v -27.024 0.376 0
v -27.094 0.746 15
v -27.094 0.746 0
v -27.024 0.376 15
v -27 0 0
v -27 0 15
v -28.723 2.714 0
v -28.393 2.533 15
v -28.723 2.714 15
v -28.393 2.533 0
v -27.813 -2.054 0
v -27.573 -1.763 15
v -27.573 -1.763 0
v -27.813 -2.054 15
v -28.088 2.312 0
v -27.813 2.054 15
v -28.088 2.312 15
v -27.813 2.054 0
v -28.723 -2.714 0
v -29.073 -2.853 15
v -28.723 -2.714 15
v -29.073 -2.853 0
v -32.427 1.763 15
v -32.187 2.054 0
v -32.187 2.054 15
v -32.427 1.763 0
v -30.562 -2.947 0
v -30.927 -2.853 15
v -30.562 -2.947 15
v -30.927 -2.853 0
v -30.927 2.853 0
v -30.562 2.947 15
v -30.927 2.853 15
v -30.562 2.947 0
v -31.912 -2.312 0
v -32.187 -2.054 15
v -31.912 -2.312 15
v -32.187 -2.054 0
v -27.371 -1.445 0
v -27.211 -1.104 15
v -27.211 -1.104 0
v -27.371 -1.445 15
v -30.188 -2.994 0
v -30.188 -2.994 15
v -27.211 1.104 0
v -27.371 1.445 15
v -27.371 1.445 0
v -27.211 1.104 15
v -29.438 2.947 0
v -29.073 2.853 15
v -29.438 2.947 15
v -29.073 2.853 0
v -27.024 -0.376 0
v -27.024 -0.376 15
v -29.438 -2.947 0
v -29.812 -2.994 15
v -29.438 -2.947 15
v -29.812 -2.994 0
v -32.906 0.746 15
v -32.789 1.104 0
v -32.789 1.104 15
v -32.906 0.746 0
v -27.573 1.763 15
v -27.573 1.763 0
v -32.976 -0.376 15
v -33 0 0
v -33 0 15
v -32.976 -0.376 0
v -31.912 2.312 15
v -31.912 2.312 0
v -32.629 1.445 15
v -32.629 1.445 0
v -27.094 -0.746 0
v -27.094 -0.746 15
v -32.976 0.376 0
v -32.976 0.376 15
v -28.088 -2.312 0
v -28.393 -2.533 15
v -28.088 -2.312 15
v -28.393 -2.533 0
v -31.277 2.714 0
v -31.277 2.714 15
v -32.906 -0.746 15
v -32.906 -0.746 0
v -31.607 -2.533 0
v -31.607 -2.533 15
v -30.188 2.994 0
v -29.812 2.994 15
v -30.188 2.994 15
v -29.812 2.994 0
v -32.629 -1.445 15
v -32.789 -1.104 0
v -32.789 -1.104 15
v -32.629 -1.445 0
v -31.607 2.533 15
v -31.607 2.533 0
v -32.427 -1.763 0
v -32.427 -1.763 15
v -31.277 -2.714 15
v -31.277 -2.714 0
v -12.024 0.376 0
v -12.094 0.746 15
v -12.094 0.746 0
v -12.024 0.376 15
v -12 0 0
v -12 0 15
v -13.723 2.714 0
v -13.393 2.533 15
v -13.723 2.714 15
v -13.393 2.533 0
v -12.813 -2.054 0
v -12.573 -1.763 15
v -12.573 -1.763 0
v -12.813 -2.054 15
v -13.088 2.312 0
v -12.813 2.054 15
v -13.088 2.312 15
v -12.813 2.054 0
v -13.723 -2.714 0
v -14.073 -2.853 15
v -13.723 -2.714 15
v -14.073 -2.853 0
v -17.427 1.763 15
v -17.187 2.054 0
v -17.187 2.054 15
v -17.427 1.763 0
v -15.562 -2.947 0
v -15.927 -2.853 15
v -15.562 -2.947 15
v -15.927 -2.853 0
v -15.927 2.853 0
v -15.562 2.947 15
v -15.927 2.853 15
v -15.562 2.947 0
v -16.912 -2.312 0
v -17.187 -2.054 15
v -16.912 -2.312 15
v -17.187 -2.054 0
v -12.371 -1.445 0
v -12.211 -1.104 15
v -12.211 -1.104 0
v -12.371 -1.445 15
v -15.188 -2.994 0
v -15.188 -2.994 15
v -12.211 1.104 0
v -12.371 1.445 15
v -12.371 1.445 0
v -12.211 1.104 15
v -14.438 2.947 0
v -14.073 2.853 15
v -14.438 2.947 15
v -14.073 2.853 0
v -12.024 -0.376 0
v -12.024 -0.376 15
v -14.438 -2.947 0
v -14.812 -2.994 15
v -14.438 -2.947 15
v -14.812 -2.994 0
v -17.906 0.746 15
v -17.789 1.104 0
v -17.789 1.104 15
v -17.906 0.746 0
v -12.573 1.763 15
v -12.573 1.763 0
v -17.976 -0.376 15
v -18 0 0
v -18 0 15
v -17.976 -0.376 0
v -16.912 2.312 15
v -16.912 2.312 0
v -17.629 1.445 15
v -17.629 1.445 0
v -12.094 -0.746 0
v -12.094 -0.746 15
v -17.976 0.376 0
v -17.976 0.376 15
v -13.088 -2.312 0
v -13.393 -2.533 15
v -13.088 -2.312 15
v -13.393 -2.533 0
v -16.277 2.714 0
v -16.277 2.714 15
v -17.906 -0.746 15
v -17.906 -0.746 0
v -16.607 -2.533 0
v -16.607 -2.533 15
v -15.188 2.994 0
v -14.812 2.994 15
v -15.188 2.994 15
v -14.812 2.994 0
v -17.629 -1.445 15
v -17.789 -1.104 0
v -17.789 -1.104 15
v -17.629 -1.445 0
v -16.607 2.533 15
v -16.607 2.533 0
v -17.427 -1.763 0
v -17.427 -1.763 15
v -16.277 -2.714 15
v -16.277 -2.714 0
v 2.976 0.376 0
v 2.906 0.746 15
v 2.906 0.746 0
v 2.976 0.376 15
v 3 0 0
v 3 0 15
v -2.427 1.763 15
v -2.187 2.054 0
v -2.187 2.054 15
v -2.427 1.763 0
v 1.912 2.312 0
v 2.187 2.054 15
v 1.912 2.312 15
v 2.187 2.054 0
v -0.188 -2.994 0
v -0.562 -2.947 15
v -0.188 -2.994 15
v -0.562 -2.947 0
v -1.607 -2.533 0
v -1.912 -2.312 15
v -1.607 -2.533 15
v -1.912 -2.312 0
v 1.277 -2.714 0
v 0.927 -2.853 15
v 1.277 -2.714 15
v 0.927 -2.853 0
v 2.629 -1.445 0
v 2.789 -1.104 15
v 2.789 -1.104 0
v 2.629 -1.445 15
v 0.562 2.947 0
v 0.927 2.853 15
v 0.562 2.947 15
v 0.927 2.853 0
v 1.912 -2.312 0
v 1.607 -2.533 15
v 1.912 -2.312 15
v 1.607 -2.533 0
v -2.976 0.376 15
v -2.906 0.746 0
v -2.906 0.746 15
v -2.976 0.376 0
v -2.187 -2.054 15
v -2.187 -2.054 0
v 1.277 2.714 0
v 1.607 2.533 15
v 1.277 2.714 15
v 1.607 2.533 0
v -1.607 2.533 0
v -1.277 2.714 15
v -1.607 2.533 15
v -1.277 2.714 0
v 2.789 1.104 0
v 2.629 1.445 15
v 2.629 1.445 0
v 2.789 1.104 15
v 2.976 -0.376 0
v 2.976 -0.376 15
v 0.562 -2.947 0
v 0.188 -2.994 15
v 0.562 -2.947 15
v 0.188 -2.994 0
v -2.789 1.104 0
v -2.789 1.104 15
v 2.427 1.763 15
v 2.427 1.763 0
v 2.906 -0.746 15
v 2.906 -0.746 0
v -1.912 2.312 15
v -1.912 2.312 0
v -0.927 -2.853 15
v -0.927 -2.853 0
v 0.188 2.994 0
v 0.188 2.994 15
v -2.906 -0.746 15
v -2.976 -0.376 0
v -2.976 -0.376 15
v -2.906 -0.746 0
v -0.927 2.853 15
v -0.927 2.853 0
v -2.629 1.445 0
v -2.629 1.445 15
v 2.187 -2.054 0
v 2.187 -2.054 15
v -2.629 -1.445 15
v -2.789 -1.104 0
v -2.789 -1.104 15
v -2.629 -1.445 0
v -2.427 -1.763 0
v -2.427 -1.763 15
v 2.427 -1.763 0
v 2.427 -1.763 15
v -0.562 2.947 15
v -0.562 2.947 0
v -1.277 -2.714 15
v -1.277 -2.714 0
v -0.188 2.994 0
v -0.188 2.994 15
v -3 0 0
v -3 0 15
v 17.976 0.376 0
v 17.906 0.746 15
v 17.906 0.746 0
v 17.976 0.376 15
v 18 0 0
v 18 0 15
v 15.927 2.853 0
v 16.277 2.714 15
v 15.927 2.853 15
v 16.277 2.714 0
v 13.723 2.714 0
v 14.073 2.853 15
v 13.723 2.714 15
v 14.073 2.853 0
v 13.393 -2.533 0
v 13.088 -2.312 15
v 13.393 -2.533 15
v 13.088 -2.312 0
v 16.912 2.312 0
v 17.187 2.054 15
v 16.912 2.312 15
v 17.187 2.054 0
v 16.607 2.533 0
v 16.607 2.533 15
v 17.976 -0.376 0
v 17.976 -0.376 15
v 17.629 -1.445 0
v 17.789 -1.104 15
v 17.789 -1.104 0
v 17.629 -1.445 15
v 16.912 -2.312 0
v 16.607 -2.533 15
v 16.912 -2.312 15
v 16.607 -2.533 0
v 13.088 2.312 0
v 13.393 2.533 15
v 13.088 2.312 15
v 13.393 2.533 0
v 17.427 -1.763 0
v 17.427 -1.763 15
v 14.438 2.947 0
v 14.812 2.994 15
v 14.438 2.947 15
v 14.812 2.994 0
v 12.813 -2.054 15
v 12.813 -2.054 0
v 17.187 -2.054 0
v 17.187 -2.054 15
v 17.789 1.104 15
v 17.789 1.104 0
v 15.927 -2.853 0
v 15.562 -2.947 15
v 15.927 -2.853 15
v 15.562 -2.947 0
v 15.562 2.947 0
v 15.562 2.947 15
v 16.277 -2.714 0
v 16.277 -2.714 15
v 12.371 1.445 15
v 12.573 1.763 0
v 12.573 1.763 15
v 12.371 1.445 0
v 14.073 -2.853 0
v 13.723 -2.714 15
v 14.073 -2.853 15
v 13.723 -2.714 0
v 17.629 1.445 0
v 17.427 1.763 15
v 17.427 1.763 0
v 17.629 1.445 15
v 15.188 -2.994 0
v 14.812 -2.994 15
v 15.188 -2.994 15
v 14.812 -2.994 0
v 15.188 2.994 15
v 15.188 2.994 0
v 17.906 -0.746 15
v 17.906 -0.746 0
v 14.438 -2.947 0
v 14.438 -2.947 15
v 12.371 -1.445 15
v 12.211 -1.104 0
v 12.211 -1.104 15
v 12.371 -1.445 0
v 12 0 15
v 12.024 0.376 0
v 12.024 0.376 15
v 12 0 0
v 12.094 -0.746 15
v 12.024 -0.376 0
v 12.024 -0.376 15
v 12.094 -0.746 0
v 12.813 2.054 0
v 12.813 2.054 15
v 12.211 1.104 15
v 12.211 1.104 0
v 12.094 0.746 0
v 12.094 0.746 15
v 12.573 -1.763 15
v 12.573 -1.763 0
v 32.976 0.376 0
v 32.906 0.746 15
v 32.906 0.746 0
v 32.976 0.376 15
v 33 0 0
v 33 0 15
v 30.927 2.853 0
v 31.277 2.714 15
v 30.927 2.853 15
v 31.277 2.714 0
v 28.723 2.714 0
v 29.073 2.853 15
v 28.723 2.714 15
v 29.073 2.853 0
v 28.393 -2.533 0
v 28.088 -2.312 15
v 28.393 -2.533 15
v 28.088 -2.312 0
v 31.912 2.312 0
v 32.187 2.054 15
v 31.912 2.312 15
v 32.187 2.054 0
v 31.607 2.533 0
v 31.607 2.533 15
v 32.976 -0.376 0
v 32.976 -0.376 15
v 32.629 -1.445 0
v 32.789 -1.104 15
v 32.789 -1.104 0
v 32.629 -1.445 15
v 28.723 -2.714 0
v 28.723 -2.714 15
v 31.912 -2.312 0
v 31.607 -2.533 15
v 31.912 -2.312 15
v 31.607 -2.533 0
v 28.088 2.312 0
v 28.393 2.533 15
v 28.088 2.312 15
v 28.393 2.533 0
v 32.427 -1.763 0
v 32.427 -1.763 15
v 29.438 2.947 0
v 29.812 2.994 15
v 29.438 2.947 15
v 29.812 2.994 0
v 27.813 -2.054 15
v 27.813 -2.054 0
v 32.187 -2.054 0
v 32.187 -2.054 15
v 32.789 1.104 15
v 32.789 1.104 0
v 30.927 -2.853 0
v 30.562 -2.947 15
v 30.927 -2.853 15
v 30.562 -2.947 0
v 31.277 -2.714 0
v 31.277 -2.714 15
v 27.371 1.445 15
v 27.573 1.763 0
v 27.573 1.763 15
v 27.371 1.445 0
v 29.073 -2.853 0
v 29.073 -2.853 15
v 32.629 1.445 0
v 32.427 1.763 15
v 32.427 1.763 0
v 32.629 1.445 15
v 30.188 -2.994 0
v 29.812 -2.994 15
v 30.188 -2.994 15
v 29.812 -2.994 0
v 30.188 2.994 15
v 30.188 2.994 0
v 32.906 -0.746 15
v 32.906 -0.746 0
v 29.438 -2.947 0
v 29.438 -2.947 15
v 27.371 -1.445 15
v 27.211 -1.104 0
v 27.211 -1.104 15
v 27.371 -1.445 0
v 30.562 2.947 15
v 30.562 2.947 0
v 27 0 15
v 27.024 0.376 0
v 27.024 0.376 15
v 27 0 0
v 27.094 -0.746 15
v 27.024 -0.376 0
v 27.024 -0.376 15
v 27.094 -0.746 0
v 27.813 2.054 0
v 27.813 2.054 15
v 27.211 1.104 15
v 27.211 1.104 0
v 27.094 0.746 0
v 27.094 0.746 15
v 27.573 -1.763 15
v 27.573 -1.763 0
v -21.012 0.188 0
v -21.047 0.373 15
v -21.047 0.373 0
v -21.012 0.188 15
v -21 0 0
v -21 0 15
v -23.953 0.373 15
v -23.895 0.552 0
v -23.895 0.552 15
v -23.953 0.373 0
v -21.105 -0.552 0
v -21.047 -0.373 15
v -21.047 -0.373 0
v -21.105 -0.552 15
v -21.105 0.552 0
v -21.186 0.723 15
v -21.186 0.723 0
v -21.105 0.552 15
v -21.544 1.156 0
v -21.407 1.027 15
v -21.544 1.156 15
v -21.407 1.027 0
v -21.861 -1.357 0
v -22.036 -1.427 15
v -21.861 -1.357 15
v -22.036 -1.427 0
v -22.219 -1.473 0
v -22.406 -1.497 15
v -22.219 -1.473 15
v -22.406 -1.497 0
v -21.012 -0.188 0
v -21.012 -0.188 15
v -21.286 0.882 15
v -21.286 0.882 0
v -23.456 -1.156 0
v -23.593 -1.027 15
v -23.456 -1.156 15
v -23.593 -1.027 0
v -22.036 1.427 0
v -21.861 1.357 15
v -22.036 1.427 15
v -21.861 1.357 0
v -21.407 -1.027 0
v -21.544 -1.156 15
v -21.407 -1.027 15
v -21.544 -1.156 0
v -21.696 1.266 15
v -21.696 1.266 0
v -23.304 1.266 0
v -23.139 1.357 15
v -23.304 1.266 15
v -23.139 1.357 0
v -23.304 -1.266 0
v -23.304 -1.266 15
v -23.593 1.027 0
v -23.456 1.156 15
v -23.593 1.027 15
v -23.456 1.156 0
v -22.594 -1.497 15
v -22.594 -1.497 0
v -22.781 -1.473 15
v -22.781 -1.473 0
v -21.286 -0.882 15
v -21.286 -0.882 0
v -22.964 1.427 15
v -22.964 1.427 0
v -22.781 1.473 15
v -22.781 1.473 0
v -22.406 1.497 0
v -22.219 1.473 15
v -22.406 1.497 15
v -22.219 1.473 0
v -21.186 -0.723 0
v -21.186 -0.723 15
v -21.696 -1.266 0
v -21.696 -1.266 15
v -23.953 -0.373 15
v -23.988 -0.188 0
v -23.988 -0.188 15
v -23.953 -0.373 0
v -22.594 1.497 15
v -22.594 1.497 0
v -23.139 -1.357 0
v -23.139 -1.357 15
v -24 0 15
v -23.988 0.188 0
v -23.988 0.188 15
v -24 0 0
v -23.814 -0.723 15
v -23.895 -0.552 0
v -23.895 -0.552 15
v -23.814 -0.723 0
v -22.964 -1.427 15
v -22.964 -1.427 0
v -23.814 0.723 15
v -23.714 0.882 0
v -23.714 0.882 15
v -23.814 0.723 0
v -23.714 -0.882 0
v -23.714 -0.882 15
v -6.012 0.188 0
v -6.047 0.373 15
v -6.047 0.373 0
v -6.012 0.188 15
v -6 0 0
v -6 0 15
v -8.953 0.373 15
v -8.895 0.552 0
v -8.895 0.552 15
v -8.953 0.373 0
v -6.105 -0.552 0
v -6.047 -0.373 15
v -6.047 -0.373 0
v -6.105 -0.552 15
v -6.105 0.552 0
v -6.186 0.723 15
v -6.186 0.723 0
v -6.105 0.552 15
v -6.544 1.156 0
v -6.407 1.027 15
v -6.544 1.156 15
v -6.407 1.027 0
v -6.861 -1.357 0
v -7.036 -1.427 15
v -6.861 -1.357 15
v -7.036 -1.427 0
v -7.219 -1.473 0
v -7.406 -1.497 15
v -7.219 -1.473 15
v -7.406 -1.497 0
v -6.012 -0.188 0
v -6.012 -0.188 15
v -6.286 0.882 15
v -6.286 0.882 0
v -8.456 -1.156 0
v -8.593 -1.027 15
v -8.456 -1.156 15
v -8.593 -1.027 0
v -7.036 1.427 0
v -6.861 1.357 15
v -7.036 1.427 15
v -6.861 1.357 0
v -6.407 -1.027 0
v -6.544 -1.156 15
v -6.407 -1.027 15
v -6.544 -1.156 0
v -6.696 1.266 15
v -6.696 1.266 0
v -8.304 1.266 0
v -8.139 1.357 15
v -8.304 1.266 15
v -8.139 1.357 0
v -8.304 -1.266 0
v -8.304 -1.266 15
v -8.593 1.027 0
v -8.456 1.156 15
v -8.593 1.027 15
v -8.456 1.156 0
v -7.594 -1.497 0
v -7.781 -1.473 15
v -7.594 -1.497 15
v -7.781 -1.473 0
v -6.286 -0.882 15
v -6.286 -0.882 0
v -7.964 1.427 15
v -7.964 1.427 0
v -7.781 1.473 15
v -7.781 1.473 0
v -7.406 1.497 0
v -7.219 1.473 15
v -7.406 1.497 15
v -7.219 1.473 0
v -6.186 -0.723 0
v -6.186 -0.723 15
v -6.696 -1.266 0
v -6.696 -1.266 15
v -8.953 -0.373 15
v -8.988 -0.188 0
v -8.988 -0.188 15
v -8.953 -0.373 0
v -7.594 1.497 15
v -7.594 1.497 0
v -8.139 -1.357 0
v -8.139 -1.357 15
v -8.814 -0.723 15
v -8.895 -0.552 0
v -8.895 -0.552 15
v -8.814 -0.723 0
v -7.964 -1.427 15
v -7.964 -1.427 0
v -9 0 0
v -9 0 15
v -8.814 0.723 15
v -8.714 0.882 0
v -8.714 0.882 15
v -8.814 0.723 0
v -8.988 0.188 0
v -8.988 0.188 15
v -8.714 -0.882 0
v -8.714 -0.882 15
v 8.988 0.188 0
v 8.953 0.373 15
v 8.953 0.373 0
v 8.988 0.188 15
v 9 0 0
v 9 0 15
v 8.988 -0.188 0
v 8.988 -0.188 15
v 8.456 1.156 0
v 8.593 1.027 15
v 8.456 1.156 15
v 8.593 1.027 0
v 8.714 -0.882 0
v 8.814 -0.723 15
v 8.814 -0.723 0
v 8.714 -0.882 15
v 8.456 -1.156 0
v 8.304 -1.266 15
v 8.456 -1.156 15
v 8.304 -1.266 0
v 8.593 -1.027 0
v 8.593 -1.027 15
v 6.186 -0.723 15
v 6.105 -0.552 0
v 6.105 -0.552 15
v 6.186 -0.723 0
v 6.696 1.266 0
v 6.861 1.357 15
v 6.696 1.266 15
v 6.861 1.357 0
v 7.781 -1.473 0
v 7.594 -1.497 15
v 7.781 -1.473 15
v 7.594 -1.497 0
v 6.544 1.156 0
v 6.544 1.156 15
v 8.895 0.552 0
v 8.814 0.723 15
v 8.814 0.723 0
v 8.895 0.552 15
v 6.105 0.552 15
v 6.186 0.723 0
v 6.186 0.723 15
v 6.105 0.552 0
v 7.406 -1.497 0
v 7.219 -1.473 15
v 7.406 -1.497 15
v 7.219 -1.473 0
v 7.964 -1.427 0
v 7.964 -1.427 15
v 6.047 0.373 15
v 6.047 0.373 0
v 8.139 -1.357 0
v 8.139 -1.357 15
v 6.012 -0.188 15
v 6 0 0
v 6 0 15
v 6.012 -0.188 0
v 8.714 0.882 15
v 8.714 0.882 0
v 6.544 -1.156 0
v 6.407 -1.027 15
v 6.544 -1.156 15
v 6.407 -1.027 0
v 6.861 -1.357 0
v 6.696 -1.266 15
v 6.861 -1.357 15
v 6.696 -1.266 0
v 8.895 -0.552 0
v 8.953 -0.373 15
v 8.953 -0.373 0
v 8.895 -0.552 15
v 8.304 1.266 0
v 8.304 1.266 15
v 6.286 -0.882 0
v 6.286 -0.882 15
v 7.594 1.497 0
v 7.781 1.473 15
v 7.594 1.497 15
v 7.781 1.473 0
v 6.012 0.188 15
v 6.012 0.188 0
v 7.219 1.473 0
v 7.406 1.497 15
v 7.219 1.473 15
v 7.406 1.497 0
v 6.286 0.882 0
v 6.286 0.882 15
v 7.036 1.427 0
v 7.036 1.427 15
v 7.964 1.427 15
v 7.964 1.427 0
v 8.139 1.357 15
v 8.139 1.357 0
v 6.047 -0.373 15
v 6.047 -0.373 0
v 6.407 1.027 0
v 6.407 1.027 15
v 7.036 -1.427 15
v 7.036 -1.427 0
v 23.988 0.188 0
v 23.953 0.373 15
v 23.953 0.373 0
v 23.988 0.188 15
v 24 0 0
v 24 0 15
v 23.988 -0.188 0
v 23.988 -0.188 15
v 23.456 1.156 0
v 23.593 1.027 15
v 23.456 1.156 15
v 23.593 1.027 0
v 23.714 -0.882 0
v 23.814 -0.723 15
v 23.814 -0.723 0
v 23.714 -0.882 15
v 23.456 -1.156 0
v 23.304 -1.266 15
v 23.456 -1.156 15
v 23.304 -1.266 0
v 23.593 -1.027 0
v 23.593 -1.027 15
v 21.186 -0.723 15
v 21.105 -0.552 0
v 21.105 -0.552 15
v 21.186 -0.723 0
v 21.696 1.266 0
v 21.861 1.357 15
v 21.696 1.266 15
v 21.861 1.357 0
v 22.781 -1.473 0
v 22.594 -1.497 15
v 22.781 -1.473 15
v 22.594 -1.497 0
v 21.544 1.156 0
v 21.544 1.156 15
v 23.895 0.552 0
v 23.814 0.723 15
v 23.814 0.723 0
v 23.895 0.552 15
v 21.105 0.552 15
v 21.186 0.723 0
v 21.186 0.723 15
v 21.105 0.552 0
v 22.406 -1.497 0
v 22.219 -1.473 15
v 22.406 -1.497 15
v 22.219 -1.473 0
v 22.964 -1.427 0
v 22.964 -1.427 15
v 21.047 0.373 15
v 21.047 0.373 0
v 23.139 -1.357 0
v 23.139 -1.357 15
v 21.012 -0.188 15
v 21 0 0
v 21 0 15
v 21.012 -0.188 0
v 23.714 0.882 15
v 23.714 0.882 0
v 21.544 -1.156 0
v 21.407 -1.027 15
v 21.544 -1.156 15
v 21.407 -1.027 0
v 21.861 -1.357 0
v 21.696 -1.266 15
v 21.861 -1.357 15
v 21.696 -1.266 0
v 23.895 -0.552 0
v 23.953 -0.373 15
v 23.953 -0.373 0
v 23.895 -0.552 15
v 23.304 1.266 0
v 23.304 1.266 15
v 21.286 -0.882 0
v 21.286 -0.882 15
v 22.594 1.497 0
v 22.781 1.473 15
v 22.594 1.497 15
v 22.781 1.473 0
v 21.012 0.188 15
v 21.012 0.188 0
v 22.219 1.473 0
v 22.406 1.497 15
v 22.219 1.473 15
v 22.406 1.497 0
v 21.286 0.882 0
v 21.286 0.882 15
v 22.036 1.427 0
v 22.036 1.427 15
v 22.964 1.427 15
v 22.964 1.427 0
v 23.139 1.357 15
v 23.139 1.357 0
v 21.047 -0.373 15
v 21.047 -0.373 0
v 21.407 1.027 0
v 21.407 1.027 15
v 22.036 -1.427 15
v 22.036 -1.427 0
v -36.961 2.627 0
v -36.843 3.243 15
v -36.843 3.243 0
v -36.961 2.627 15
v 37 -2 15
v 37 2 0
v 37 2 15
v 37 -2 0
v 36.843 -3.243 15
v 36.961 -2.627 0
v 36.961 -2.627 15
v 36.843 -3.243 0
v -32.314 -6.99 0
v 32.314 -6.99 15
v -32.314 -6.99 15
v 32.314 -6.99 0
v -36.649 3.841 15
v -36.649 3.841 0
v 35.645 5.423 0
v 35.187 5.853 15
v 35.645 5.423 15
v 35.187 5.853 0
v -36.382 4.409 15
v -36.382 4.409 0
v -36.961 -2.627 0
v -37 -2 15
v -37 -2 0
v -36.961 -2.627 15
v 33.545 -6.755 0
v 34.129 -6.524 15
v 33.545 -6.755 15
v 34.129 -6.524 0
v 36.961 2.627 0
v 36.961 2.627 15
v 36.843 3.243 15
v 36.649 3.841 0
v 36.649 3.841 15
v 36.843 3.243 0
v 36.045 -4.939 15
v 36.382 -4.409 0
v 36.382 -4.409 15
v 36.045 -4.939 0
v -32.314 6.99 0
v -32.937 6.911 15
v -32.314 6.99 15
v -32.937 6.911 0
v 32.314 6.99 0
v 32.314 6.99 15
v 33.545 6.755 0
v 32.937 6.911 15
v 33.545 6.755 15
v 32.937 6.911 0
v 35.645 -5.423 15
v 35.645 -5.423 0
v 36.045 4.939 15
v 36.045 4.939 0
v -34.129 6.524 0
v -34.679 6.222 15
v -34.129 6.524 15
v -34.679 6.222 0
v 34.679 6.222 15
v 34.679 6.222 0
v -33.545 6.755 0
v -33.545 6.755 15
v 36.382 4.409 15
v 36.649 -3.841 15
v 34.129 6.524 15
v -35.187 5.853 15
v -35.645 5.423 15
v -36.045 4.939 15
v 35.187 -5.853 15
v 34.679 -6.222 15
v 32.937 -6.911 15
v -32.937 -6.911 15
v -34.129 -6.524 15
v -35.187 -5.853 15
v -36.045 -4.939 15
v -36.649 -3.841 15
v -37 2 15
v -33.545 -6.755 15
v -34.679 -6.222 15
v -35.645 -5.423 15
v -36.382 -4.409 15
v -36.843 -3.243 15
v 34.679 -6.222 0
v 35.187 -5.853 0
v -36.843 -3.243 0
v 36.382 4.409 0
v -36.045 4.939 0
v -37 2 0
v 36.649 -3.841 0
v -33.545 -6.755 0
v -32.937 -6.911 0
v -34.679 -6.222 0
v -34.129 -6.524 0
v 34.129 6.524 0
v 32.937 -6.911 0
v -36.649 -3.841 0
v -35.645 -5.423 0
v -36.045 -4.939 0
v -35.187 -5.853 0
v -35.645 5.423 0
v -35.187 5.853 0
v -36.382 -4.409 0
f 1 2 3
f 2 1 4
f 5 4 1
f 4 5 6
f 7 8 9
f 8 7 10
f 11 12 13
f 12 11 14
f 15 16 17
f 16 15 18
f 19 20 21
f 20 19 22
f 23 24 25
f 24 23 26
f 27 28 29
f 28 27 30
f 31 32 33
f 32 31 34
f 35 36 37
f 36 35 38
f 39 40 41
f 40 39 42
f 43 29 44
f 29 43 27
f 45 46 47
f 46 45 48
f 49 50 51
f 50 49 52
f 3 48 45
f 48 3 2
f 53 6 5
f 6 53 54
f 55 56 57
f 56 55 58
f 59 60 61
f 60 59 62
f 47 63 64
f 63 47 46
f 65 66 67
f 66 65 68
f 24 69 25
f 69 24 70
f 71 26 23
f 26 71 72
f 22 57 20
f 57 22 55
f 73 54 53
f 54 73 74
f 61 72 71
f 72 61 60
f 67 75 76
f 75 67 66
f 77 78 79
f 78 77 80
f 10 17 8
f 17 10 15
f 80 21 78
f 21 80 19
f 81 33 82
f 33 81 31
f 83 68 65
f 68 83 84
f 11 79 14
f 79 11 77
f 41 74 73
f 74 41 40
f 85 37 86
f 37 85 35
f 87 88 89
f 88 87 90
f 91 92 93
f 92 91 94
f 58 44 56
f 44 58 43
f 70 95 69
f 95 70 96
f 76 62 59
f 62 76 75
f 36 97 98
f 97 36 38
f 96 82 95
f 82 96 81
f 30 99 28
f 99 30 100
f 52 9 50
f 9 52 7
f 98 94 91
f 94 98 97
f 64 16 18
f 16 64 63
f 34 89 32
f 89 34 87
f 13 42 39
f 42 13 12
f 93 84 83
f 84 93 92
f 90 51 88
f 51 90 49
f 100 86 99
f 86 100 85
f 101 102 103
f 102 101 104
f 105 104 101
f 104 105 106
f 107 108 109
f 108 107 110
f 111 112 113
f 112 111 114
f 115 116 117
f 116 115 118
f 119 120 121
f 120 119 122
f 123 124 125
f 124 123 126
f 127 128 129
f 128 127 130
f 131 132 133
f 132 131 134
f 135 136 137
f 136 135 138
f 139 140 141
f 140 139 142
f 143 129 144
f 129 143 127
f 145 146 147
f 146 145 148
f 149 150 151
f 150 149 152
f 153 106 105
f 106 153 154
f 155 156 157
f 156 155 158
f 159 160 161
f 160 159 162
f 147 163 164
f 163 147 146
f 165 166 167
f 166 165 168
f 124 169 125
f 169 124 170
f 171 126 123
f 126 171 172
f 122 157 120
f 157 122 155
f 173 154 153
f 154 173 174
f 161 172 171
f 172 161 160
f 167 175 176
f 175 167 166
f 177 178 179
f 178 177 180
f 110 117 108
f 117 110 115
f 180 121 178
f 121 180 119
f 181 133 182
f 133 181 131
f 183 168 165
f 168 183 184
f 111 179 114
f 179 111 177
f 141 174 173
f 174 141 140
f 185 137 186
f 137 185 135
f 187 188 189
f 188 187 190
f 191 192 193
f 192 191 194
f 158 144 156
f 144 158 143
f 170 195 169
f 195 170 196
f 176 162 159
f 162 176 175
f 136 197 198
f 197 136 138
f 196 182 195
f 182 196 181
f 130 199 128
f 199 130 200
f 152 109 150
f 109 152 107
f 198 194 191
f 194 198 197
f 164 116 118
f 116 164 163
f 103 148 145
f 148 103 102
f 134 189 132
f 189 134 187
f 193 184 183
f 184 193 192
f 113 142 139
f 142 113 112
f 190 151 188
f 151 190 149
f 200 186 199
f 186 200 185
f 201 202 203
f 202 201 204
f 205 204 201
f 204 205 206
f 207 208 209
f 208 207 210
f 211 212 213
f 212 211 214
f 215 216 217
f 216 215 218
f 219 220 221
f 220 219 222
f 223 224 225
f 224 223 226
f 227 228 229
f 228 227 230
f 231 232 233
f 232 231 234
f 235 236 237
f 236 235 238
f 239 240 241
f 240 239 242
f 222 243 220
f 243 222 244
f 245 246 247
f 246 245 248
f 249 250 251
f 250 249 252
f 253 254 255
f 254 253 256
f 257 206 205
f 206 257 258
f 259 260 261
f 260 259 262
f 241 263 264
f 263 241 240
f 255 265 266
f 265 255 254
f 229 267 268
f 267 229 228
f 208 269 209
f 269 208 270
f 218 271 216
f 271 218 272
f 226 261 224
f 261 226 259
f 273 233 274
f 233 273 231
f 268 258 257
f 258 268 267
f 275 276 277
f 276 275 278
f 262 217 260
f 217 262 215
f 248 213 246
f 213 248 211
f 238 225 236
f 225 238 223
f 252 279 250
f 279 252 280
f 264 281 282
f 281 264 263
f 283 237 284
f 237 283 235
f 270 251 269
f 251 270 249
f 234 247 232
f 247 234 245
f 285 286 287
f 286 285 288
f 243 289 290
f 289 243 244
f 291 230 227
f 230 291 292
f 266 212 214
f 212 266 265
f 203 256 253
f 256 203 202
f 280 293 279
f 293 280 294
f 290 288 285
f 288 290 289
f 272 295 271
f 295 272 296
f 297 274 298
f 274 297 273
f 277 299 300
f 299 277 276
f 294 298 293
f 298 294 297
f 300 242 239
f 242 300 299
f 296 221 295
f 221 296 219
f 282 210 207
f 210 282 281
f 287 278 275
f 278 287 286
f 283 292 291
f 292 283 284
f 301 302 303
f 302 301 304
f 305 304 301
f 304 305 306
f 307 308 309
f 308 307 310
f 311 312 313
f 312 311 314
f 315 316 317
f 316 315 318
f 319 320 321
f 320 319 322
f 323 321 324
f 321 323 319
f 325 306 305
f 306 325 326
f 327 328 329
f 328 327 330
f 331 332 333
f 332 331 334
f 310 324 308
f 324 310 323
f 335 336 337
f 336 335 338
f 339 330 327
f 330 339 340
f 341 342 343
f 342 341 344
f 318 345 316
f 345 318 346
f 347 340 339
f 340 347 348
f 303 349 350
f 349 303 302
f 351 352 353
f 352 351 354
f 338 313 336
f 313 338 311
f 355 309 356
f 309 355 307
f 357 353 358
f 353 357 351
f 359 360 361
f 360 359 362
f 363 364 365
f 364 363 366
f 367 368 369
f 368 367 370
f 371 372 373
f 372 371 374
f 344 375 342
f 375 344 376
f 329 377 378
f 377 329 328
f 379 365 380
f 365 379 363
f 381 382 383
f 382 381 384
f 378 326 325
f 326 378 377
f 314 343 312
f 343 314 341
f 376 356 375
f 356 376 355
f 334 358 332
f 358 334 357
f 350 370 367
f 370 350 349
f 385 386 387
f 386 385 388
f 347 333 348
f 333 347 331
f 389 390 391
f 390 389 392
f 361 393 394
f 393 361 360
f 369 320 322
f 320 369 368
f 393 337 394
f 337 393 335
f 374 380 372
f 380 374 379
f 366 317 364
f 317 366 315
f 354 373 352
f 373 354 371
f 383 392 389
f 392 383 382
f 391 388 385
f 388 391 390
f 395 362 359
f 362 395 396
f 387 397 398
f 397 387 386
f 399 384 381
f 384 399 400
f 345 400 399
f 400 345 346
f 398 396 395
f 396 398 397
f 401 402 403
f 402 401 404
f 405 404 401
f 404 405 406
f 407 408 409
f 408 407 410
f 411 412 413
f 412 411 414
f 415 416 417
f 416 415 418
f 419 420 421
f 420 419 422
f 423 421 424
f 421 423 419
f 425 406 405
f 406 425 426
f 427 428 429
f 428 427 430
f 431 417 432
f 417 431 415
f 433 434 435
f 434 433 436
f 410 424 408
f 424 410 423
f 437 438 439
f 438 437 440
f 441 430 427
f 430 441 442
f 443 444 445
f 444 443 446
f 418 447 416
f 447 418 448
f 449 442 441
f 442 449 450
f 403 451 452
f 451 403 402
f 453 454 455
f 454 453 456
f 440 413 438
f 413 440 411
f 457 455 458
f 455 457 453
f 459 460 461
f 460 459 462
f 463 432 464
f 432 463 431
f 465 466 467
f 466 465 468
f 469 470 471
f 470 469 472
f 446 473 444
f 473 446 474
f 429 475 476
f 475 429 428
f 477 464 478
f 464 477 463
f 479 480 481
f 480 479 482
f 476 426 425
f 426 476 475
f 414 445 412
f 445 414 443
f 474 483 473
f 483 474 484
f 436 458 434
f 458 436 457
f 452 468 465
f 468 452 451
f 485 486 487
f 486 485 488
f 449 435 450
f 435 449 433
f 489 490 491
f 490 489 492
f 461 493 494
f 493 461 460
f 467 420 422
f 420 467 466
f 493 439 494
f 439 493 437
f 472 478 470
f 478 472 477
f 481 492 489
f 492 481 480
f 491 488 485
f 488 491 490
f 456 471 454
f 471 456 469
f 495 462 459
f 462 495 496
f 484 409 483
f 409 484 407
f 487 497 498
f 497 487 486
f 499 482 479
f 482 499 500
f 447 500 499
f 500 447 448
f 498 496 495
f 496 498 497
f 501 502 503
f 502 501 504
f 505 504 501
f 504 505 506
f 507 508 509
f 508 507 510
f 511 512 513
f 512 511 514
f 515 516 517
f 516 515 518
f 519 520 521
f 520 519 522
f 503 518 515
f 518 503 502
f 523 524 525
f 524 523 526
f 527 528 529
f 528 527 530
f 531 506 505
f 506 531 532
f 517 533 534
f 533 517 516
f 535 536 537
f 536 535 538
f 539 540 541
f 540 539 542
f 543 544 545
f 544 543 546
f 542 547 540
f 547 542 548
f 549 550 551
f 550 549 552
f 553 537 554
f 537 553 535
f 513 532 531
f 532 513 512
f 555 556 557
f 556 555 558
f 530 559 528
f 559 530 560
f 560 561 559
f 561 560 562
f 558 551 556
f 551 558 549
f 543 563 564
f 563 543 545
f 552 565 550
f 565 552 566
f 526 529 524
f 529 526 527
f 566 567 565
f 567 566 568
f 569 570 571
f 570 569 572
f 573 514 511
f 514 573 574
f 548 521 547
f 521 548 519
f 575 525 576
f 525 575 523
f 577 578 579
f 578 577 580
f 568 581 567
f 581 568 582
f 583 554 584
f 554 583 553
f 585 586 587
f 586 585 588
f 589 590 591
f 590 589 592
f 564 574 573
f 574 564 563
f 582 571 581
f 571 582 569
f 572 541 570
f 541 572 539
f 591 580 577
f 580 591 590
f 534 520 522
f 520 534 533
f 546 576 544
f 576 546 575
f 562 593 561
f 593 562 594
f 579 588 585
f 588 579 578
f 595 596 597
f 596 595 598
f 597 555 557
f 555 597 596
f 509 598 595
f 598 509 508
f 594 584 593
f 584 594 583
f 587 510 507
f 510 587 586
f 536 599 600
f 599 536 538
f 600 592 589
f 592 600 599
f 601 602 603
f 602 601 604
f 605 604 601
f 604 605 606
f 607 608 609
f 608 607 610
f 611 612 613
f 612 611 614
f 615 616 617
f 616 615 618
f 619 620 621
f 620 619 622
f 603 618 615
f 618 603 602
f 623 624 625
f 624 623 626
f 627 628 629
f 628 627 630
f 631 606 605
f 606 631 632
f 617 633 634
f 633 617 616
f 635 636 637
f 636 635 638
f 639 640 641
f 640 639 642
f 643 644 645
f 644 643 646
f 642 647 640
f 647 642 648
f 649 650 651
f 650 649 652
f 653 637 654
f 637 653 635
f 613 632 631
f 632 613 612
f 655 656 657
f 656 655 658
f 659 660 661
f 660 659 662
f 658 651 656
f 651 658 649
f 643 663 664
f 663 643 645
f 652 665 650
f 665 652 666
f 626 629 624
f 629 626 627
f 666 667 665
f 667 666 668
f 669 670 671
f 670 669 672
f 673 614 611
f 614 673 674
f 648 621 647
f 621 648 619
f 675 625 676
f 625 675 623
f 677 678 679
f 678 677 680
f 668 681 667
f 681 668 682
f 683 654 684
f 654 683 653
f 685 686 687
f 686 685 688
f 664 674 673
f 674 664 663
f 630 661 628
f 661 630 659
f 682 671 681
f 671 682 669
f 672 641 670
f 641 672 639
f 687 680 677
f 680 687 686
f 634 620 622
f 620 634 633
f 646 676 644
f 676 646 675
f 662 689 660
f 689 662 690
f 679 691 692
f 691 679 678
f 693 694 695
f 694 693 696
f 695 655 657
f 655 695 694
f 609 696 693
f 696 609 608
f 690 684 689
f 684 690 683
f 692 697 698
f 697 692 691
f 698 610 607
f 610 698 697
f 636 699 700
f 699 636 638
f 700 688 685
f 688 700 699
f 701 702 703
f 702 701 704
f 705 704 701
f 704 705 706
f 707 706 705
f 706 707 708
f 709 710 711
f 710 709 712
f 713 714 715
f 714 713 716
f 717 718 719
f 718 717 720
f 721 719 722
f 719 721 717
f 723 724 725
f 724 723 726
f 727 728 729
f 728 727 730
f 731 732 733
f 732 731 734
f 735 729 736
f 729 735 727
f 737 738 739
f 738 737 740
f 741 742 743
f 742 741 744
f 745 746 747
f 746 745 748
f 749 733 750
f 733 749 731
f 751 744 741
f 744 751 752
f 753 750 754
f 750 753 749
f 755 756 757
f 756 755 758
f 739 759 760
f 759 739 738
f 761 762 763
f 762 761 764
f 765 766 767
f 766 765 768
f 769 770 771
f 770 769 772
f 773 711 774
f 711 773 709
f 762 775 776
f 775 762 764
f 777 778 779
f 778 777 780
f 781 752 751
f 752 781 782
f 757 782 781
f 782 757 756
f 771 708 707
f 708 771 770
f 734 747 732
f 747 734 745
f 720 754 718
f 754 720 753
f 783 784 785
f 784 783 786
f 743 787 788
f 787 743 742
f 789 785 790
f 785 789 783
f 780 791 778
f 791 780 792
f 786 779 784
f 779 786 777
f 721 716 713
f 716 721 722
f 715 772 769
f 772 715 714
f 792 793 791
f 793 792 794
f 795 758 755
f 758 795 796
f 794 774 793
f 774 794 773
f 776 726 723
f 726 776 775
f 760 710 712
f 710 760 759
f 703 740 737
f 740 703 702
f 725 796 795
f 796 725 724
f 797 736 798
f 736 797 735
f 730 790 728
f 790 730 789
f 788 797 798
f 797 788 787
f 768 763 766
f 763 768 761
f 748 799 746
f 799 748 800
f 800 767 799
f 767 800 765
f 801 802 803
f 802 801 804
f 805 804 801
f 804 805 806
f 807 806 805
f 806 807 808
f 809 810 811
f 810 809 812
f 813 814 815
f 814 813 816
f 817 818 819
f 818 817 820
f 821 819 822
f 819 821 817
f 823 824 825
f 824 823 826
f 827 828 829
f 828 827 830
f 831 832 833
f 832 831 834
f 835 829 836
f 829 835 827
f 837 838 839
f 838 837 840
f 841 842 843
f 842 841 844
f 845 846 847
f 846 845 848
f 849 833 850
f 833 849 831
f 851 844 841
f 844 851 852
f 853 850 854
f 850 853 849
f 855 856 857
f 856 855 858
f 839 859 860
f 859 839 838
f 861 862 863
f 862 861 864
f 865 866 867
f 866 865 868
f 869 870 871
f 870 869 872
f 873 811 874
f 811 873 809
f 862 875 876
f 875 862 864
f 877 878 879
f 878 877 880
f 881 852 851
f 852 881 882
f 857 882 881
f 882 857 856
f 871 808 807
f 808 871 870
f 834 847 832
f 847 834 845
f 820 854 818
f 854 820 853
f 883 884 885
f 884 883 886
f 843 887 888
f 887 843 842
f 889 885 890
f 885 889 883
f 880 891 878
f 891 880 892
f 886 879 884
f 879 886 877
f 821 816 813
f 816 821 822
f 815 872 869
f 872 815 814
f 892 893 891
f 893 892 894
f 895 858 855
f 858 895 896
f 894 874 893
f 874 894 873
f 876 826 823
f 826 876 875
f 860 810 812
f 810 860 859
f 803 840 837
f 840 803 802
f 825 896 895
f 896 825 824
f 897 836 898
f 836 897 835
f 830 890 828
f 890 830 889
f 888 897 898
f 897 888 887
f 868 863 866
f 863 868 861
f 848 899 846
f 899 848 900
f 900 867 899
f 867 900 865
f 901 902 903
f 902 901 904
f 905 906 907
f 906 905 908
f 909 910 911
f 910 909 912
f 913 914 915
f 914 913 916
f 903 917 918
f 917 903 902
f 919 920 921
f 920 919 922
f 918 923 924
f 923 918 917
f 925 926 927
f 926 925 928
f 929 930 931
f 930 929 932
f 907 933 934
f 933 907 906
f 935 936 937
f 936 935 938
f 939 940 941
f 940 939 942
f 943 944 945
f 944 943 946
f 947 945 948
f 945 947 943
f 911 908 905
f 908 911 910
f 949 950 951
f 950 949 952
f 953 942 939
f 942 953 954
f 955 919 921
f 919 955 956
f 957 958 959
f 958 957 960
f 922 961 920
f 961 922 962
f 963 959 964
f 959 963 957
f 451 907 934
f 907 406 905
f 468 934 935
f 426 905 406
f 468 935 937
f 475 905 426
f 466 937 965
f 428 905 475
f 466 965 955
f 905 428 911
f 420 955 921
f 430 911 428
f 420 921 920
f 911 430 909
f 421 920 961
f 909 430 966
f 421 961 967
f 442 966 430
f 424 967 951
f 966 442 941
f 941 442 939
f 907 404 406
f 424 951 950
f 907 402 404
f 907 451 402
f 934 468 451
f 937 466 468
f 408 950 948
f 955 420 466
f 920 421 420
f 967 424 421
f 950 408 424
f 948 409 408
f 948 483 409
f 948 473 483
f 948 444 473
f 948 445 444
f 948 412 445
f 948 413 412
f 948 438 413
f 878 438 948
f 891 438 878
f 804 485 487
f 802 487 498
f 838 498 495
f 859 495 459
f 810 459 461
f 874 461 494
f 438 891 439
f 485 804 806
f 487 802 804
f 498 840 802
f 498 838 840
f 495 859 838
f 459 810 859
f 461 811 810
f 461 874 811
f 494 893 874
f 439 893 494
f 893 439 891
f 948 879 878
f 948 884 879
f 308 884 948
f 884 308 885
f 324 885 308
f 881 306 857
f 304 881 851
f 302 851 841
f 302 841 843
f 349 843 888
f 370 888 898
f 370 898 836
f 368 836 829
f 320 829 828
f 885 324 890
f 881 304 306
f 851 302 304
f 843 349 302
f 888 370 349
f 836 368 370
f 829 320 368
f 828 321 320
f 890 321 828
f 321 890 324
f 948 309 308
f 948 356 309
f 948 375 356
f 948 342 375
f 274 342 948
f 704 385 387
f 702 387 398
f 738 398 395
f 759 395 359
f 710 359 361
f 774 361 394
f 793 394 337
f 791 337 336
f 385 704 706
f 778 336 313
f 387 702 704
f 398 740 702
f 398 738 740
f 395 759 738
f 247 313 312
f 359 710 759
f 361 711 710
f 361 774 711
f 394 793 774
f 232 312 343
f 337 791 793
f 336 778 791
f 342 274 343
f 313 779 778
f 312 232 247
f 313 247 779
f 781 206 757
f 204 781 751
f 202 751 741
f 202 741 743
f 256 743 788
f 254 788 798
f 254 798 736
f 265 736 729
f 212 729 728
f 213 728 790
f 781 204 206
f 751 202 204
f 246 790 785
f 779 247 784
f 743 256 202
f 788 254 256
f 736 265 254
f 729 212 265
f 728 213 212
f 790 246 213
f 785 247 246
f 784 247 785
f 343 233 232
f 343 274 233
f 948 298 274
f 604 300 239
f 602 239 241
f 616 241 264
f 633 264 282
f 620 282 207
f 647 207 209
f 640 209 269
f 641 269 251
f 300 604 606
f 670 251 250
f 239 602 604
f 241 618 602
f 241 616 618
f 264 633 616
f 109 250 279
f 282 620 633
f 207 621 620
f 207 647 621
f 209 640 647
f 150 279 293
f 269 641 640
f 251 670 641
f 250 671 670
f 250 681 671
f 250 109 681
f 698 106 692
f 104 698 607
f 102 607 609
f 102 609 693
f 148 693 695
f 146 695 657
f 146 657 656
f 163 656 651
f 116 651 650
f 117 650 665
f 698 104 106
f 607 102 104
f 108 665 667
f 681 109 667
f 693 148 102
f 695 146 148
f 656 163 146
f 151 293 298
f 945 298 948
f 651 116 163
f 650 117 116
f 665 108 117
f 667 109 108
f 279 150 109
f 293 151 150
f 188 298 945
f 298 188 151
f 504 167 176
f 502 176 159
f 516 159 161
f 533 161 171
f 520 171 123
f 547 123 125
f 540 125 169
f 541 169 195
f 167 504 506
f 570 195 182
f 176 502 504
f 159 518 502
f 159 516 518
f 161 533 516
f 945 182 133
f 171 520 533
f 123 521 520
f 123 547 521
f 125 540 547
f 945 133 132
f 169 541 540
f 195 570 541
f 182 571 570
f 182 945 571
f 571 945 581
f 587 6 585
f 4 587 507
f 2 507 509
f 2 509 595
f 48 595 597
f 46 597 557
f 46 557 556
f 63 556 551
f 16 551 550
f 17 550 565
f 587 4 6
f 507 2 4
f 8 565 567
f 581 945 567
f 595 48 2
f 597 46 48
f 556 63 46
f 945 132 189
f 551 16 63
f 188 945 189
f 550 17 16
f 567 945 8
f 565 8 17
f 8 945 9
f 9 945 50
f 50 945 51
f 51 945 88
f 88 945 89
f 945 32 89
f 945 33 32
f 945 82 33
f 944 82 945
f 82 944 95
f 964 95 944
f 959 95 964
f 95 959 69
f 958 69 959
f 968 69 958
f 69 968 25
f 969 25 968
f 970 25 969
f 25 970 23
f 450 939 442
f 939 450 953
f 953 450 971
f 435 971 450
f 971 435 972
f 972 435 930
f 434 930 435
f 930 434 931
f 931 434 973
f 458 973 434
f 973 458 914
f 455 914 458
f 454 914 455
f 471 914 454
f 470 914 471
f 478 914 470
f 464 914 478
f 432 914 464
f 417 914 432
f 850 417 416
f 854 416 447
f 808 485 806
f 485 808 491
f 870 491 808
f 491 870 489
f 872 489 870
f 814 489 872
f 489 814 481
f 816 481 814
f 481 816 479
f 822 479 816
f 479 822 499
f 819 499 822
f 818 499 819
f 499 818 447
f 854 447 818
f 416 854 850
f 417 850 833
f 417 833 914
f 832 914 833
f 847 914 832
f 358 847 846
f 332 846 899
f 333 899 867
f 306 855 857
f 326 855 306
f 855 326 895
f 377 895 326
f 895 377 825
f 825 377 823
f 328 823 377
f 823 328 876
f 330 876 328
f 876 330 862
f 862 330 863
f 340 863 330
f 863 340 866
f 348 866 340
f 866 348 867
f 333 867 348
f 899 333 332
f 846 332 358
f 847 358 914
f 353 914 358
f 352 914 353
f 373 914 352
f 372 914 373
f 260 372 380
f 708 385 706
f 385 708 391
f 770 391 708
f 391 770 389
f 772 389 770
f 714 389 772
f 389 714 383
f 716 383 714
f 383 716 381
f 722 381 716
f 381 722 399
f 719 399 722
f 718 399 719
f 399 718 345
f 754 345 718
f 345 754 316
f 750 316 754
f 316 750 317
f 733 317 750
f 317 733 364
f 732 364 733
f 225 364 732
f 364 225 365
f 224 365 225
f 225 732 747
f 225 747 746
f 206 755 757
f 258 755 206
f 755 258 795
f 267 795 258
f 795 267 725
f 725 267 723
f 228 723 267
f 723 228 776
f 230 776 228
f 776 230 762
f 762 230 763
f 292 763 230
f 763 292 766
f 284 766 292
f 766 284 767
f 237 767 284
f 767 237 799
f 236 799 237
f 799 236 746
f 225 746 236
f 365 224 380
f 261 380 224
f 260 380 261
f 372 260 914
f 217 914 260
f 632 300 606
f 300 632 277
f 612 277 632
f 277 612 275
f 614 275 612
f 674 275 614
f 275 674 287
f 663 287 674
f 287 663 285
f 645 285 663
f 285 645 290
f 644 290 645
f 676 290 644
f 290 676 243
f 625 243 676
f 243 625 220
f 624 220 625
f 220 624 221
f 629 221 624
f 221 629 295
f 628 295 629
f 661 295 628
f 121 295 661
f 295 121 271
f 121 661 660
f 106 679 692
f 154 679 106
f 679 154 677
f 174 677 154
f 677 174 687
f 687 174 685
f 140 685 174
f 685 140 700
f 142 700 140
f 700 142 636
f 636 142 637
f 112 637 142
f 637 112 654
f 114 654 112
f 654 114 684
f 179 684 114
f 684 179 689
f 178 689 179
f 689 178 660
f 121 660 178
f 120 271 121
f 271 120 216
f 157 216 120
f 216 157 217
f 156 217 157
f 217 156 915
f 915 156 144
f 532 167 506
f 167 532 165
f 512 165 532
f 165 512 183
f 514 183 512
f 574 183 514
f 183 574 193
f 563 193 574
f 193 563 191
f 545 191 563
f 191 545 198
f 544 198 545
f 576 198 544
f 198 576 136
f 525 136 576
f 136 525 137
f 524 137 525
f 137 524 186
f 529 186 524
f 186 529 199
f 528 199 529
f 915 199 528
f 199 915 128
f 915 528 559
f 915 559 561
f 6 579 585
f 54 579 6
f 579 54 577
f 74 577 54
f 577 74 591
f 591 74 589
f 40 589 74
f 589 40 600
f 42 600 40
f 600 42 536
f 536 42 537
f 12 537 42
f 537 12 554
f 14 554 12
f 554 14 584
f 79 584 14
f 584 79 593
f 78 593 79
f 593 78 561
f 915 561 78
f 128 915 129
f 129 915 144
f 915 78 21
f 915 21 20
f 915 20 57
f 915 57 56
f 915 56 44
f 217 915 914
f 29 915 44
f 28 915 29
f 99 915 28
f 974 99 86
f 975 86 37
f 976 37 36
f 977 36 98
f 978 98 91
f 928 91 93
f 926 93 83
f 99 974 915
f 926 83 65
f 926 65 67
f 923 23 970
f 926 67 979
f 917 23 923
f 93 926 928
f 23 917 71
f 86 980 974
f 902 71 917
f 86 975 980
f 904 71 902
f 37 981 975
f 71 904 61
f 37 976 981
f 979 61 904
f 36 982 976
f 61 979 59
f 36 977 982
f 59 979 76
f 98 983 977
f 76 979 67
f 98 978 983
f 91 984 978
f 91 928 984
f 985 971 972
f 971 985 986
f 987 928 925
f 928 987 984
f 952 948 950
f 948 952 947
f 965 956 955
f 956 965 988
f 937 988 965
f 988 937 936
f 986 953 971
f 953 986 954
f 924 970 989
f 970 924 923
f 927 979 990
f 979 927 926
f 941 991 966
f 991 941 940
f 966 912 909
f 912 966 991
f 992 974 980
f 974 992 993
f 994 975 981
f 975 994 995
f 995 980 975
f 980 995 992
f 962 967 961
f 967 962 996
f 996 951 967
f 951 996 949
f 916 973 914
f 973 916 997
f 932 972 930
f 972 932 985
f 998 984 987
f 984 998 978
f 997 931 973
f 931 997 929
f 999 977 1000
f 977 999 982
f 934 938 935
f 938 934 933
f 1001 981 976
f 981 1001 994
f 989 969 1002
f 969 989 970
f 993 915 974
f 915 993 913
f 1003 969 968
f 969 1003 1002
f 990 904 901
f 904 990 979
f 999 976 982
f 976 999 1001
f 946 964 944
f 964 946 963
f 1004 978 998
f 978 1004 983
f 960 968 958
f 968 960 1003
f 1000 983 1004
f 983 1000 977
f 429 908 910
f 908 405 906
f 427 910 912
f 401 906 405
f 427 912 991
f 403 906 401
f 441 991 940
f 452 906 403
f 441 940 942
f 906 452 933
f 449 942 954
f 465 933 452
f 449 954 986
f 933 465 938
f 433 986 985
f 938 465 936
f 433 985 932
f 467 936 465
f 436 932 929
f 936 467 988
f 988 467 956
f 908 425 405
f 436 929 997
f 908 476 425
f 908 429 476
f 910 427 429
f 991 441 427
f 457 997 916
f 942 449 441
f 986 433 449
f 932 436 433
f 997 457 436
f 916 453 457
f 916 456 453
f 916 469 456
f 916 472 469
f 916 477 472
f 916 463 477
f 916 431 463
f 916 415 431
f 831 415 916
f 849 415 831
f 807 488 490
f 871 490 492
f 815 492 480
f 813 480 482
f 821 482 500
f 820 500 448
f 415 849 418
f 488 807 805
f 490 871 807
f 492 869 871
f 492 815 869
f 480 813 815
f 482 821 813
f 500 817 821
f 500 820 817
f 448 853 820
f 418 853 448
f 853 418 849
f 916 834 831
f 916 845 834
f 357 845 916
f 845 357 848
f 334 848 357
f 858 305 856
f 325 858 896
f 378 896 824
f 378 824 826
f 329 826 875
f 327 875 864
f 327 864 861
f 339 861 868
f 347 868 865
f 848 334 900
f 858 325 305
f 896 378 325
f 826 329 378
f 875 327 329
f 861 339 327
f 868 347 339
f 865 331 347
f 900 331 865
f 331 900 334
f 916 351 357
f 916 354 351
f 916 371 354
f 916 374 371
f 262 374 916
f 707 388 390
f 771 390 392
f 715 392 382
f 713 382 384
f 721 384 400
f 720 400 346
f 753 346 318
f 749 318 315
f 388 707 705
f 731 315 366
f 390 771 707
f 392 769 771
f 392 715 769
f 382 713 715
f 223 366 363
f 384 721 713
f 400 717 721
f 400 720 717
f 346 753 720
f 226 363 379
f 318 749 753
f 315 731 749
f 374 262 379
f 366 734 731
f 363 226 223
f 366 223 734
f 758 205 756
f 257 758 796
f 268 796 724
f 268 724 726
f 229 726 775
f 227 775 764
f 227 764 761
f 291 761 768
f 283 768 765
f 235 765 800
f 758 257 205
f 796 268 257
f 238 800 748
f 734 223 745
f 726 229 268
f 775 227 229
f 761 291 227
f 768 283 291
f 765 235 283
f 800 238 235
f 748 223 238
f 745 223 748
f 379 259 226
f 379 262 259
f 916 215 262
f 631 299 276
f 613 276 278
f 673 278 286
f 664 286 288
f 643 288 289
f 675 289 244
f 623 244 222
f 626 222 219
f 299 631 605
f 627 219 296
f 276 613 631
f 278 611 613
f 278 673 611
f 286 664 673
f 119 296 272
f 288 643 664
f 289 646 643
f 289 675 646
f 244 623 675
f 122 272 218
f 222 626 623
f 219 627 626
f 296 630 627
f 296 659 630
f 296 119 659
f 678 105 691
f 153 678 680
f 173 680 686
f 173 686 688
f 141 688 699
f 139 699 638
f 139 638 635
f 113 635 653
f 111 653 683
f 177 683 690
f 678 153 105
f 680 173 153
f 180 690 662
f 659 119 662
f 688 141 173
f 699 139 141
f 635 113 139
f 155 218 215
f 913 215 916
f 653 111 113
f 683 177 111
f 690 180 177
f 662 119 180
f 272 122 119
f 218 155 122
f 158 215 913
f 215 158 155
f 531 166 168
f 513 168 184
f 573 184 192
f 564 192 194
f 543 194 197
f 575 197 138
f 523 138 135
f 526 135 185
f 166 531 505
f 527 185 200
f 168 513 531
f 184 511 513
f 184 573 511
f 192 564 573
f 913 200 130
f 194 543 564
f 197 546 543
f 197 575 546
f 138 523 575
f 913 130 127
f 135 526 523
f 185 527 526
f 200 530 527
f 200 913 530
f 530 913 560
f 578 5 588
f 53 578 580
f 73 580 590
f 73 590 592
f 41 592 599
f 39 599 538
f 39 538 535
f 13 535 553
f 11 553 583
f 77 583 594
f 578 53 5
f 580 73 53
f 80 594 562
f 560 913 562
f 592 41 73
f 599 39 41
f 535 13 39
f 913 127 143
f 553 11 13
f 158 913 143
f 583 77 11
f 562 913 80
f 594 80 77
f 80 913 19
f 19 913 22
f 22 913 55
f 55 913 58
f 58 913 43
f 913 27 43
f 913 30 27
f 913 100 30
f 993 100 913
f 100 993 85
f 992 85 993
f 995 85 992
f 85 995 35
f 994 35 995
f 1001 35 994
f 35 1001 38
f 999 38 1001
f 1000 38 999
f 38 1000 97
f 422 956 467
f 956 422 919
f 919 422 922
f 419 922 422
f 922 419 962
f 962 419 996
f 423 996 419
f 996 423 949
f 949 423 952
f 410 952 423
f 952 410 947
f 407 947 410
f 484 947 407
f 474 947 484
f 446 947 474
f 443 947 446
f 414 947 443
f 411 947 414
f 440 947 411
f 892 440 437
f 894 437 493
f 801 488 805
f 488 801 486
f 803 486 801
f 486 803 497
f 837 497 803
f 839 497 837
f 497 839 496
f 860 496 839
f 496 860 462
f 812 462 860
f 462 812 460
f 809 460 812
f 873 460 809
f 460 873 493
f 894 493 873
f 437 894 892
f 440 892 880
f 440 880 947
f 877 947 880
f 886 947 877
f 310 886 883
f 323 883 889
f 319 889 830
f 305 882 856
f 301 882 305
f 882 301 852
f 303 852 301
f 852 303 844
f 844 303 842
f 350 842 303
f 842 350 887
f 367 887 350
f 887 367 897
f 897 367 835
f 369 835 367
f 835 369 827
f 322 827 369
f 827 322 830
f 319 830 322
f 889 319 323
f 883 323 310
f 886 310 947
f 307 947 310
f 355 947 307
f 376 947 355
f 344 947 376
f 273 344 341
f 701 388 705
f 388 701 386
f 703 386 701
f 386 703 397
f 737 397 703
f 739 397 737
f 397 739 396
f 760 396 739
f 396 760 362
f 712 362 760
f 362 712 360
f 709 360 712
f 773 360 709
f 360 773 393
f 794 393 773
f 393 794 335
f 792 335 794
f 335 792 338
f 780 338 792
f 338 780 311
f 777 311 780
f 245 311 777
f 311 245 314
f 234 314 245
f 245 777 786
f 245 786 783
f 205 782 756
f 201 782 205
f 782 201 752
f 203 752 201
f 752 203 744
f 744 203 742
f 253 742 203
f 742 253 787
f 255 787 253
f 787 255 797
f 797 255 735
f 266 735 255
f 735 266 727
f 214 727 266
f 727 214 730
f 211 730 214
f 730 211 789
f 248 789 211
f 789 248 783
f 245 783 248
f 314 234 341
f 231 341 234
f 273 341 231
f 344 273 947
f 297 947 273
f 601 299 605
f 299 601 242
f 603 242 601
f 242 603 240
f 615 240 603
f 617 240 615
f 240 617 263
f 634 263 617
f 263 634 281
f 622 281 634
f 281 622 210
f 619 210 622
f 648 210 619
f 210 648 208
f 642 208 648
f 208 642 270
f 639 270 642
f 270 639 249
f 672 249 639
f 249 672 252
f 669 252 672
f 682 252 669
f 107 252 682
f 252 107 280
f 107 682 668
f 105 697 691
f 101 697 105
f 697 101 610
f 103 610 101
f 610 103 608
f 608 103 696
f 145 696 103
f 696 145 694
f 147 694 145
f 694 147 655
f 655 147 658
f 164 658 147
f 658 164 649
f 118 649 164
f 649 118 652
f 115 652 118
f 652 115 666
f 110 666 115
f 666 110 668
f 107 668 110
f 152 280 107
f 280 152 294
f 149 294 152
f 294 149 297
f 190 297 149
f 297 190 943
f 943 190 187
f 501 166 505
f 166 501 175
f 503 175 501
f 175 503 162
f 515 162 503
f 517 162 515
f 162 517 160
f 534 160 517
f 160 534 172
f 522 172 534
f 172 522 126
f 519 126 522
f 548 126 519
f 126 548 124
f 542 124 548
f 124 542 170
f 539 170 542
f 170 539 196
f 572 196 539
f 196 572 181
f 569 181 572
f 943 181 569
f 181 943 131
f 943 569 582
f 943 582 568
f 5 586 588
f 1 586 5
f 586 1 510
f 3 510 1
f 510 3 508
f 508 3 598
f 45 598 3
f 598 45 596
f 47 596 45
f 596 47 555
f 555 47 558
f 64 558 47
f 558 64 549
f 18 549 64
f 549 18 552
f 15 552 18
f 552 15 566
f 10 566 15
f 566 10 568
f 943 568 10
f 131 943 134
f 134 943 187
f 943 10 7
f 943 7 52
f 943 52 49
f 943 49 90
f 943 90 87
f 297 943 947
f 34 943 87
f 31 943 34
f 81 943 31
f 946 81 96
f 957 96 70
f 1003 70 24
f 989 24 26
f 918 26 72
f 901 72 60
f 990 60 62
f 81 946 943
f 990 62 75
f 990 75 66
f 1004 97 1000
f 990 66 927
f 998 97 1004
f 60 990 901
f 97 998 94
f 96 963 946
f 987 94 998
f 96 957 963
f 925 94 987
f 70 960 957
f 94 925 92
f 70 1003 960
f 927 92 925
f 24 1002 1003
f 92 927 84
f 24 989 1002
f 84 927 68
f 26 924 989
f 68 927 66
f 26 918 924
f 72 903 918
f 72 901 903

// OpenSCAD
$fn = 50;


difference() {
	union() {
		*color(alpha = 1.0000000000, c = "gray") {
			translate(v = [0, 7, 0]) {
				linear_extrude(height = 1) {
					text(font = "Arial:style=Bold", halign = "center", size = 4.5000000000, text = "COMMENT plate main", valign = "center");
				}
			}
		}
		hull() {
			translate(v = [-32.0000000000, 2.0000000000, 0]) {
				cylinder(h = 15, r = 5);
			}
			translate(v = [32.0000000000, 2.0000000000, 0]) {
				cylinder(h = 15, r = 5);
			}
			translate(v = [-32.0000000000, -2.0000000000, 0]) {
				cylinder(h = 15, r = 5);
			}
			translate(v = [32.0000000000, -2.0000000000, 0]) {
				cylinder(h = 15, r = 5);
			}
		}
	}
	union() {
		*color(alpha = 1.0000000000, c = "gray") {
			translate(v = [0, 7, 0]) {
				linear_extrude(height = 1) {
					text(font = "Arial:style=Bold", halign = "center", size = 4.5000000000, text = "COMMENT holes main", valign = "center");
				}
			}
		}
		translate(v = [-30.0000000000, 0.0000000000, 0]) {
			translate(v = [0, 0, -100]) {
				cylinder(h = 200, r = 3.0000000000);
			}
		}
		translate(v = [-15.0000000000, 0.0000000000, 0]) {
			translate(v = [0, 0, -100]) {
				cylinder(h = 200, r = 3.0000000000);
			}
		}
		translate(v = [0, 0, -100]) {
			cylinder(h = 200, r = 3.0000000000);
		}
		translate(v = [15.0000000000, 0.0000000000, 0]) {
			translate(v = [0, 0, -100]) {
				cylinder(h = 200, r = 3.0000000000);
			}
		}
		translate(v = [30.0000000000, 0.0000000000, 0]) {
			translate(v = [0, 0, -100]) {
				cylinder(h = 200, r = 3.0000000000);
			}
		}
		translate(v = [-30.0000000000, 0.0000000000, 0]) {
			translate(v = [0, 0, -100]) {
				cylinder(h = 200, r = 1.5000000000);
			}
		}
		translate(v = [-22.5000000000, 0.0000000000, 0]) {
			translate(v = [0, 0, -100]) {
				cylinder(h = 200, r = 1.5000000000);
			}
		}
		translate(v = [-15.0000000000, 0.0000000000, 0]) {
			translate(v = [0, 0, -100]) {
				cylinder(h = 200, r = 1.5000000000);
			}
		}
		translate(v = [-7.5000000000, 0.0000000000, 0]) {
			translate(v = [0, 0, -100]) {
				cylinder(h = 200, r = 1.5000000000);
			}
		}
		translate(v = [0, 0, -100]) {
			cylinder(h = 200, r = 1.5000000000);
		}
		translate(v = [7.5000000000, 0.0000000000, 0]) {
			translate(v = [0, 0, -100]) {
				cylinder(h = 200, r = 1.5000000000);
			}
		}
		translate(v = [15.0000000000, 0.0000000000, 0]) {
			translate(v = [0, 0, -100]) {
				cylinder(h = 200, r = 1.5000000000);
			}
		}
		translate(v = [22.5000000000, 0.0000000000, 0]) {
			translate(v = [0, 0, -100]) {
				cylinder(h = 200, r = 1.5000000000);
			}
		}
		translate(v = [30.0000000000, 0.0000000000, 0]) {
			translate(v = [0, 0, -100]) {
				cylinder(h = 200, r = 1.5000000000);
			}
		}
	}
}
